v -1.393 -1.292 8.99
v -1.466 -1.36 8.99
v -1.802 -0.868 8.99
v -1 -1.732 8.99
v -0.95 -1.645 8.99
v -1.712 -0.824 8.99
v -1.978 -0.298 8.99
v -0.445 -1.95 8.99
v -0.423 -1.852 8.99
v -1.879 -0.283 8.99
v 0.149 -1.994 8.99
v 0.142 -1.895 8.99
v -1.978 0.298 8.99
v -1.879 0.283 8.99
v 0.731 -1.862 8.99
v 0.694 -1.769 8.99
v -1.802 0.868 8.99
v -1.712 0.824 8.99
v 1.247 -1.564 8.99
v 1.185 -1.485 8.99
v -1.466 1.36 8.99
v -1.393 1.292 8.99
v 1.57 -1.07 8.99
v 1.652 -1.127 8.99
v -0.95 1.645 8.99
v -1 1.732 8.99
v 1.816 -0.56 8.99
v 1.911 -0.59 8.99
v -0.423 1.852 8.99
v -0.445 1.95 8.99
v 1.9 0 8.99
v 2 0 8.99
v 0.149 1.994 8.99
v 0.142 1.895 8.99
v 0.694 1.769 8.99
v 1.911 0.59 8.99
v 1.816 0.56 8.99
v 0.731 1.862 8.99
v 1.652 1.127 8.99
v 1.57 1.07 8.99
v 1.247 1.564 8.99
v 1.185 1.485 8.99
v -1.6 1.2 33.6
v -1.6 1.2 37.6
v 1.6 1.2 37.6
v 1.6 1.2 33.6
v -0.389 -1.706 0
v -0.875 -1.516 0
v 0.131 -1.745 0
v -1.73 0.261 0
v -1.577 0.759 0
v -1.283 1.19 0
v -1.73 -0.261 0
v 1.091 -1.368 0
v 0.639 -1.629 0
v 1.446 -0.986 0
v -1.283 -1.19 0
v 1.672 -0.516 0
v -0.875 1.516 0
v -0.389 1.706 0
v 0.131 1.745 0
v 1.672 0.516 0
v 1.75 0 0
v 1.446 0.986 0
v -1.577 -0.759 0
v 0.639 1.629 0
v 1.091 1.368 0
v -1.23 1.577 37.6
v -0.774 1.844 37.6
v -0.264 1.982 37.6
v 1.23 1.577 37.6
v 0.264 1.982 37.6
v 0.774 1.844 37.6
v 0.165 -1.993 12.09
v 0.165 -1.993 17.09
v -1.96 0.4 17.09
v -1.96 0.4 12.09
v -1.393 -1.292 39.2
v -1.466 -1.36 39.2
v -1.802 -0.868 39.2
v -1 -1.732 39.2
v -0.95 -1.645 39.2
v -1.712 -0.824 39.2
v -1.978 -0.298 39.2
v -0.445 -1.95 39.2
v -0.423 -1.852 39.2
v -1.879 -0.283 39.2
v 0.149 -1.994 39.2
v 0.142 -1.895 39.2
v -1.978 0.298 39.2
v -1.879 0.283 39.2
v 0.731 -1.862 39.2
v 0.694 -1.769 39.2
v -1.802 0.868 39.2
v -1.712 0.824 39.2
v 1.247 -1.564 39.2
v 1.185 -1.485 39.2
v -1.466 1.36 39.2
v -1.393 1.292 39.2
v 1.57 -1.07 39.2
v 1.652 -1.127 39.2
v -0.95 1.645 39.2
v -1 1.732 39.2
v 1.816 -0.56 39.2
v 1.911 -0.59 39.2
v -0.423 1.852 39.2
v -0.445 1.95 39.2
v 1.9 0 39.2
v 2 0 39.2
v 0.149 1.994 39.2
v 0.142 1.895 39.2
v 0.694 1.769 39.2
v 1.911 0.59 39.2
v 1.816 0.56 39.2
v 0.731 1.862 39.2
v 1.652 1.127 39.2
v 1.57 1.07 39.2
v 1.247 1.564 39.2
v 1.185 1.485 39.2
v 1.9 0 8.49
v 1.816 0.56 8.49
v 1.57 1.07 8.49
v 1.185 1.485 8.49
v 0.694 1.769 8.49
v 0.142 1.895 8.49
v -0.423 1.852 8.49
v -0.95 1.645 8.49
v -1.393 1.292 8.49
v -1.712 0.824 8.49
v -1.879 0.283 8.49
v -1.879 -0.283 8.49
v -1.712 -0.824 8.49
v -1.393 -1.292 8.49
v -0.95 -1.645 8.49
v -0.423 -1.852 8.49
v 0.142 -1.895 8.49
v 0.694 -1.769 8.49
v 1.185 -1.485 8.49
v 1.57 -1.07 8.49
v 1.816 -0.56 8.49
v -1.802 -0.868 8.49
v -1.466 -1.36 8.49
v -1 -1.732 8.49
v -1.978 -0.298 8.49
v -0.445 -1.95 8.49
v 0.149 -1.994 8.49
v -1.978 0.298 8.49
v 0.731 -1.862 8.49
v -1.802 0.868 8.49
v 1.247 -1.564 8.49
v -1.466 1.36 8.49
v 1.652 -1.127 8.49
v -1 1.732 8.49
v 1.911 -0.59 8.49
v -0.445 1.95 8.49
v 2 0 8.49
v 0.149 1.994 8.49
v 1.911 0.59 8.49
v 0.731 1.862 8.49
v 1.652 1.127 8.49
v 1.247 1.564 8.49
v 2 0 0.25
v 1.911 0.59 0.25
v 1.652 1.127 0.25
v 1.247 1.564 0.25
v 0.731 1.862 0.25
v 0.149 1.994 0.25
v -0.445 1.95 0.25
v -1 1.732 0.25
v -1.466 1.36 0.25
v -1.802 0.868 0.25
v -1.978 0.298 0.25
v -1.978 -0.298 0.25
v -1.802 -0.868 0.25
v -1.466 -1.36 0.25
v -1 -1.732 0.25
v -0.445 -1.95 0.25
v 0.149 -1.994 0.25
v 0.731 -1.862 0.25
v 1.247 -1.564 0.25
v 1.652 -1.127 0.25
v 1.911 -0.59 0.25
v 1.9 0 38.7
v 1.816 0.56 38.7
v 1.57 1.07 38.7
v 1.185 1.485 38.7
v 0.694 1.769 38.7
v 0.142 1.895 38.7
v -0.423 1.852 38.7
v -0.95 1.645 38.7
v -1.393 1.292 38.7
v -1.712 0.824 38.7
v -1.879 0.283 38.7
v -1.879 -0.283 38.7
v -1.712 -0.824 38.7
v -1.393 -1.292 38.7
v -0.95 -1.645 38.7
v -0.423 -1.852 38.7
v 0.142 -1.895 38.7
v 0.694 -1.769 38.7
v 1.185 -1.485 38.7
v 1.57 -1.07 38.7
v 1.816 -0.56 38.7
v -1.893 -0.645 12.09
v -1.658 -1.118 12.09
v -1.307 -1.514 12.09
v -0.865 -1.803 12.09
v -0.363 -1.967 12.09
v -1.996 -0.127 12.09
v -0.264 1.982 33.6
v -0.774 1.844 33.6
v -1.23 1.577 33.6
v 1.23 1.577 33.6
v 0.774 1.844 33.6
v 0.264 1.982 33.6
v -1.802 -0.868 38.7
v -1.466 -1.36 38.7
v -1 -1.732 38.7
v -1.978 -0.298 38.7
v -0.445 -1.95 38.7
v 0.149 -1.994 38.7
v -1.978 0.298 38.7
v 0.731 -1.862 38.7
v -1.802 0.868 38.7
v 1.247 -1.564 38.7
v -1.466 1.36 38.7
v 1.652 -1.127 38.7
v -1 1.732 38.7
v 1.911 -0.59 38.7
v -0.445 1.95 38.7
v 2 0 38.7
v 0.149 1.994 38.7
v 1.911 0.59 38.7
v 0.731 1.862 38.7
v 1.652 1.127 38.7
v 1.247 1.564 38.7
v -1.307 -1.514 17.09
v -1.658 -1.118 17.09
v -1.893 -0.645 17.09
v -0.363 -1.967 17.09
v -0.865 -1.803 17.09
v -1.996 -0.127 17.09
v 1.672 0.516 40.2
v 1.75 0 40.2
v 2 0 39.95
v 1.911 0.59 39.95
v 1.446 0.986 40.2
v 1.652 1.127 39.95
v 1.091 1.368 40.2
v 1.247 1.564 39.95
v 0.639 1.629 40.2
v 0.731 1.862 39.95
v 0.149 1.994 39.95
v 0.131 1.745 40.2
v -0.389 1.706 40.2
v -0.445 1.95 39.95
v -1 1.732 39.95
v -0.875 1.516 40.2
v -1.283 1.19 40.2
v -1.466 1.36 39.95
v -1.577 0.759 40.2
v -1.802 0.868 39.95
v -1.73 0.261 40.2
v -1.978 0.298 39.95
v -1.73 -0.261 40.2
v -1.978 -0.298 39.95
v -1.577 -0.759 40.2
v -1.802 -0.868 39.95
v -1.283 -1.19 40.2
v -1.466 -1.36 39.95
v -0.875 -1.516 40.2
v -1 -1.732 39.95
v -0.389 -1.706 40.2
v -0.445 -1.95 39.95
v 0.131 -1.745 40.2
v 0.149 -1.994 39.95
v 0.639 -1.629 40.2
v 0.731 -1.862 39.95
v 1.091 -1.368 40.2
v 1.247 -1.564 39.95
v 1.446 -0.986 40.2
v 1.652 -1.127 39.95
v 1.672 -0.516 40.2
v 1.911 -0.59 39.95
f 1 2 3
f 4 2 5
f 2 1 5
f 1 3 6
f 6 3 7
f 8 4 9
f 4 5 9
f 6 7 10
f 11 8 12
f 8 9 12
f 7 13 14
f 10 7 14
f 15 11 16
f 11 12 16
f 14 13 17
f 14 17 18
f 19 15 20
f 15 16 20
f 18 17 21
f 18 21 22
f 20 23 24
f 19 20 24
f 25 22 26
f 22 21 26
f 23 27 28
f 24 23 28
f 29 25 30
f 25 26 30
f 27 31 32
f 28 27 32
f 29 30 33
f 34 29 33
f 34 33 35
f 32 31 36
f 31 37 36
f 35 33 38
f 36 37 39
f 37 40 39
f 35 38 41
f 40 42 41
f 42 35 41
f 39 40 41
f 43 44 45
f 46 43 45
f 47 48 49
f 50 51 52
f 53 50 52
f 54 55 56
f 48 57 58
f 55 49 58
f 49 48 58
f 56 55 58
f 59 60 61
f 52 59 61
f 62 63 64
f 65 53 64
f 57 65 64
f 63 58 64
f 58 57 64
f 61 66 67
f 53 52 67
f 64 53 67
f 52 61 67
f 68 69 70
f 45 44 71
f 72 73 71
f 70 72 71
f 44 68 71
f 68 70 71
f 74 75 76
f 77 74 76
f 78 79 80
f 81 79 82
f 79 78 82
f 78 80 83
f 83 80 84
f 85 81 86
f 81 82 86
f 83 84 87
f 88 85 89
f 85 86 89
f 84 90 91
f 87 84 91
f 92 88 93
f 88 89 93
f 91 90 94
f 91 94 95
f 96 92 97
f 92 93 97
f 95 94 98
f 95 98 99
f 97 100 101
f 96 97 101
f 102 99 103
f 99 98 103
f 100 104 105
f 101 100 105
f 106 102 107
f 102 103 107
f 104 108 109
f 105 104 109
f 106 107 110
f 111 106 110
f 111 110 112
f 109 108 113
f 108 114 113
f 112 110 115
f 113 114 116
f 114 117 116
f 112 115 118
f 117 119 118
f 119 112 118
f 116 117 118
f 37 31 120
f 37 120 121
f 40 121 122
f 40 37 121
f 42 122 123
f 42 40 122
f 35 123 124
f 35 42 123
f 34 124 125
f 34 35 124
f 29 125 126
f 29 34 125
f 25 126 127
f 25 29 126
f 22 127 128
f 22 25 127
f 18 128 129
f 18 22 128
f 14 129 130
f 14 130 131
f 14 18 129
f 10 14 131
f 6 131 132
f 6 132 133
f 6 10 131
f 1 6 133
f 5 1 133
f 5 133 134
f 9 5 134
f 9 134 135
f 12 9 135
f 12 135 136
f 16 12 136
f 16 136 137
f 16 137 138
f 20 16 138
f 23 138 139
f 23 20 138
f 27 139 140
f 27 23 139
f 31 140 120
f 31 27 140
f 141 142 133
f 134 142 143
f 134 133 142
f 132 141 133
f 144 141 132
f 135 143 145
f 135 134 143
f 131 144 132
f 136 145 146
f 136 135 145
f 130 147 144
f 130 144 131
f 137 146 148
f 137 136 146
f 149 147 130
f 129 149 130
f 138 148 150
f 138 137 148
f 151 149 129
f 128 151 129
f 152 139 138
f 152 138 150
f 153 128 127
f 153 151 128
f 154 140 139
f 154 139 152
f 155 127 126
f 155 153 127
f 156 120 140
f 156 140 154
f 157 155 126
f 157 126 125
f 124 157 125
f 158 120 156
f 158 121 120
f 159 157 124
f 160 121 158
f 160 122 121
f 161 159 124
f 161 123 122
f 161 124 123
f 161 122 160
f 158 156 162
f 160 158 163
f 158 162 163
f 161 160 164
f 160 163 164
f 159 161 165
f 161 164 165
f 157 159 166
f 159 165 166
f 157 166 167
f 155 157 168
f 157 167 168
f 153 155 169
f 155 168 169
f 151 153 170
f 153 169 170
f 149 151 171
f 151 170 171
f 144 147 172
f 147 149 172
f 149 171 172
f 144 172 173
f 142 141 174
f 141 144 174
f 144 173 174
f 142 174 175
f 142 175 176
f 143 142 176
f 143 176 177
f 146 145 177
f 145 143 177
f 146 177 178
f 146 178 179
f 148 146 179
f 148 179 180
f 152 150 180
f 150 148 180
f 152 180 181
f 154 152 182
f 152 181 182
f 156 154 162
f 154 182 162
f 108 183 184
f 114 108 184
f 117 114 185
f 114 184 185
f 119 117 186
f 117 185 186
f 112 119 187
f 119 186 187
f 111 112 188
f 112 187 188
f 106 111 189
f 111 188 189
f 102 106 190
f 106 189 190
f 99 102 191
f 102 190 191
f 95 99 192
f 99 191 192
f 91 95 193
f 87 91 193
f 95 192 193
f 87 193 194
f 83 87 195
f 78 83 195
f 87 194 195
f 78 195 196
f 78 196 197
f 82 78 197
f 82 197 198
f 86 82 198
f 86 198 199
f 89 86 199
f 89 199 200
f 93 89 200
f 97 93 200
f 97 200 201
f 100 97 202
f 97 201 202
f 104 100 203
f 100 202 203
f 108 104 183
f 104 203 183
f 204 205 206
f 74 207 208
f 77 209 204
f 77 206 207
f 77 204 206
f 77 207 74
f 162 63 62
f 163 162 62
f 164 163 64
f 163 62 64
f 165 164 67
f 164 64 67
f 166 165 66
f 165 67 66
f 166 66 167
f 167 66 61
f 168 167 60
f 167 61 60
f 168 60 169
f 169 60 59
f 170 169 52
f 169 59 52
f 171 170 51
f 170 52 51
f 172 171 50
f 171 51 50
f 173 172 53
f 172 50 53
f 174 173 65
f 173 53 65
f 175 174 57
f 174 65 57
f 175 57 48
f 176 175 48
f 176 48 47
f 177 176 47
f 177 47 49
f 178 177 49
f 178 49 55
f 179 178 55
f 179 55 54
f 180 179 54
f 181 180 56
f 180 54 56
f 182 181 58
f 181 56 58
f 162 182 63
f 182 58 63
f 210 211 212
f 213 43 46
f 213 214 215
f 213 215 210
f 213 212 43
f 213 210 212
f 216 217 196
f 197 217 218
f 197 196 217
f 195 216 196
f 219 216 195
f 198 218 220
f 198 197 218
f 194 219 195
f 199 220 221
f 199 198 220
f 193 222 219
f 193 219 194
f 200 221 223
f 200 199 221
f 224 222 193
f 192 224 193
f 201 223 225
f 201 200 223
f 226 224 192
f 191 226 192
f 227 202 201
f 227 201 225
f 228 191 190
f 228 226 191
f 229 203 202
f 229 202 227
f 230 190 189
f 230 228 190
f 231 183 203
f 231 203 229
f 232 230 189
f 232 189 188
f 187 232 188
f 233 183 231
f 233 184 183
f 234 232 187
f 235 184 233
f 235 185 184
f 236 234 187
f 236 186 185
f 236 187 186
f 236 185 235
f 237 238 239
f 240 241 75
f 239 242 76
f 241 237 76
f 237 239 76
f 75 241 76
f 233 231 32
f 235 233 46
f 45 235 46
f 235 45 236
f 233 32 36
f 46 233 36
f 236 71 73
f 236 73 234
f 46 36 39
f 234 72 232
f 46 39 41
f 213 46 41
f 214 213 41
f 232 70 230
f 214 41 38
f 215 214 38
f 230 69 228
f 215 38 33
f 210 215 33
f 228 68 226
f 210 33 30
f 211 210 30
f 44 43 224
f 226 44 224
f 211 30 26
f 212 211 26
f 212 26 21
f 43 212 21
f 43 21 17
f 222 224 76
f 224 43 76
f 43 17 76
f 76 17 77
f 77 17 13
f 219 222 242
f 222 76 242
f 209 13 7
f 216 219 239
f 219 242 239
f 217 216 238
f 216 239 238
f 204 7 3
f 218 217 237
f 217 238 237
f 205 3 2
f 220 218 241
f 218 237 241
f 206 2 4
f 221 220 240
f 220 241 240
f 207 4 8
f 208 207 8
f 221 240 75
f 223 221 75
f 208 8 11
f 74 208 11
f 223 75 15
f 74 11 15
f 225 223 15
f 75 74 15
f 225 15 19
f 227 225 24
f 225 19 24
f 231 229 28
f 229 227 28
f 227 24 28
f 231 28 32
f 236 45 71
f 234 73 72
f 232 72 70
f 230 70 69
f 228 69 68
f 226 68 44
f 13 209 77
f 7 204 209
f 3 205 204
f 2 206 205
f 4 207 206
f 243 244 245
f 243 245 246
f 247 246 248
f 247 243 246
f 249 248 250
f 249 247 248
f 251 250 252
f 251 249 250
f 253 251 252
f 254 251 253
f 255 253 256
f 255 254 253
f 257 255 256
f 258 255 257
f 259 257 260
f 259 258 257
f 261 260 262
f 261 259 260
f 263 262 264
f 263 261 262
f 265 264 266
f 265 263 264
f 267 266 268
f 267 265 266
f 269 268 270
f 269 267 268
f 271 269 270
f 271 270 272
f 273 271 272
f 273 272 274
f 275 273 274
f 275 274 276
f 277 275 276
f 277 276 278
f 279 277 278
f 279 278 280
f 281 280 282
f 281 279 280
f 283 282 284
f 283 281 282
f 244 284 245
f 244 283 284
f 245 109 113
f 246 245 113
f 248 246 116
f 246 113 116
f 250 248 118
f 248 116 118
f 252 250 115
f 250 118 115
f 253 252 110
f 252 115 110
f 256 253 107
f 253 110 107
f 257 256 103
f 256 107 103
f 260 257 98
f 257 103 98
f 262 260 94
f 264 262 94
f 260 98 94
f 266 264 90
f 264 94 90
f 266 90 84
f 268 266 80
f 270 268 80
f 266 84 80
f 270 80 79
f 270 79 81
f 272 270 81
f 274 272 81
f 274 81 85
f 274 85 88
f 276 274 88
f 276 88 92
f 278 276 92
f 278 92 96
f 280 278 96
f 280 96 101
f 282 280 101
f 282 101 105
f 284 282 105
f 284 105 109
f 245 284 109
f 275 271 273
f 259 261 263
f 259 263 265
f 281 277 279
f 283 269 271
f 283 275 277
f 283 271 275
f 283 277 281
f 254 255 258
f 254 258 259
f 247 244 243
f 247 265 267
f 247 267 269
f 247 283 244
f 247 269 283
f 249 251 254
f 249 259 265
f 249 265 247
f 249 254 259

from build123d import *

# Parameters (mm, degrees)
CIRCLE_R                     = 2
BOSS_EXTRU_1_DEPTH           = 40.2
ENL_V_MAT_EXTRU_1_DEPTH      = 4
ENL_V_MAT_EXTRU_2_DEPTH      = 5
GORGECIRCLIPPOLULU_OUTSIDE_W = 14.12
GORGECIRCLIPPOLULU_OUTSIDE_H = 14.12
GORGECIRCLIPPOLULU_OUTSIDE_R = 1.9
ENL_V_MAT_EXTRU_3_DEPTH      = 0.5
ESQUISSE1_OUTSIDE_W          = 14.12
ESQUISSE1_OUTSIDE_H          = 14.12
ESQUISSE1_OUTSIDE_R          = 1.9
ENL_V_MAT_EXTRU_4_DEPTH      = 0.5
CHANFREIN1_SIZE              = 0.25
CHANFREIN2_SIZE              = 0.25


with BuildPart() as part:
    # Circle → Boss.-Extru.1 (new body)
    with BuildSketch(Plane.XY):
        Circle(CIRCLE_R)
    extrude(amount=BOSS_EXTRU_1_DEPTH)

    # MeplatPololu → Enlèv. mat.-Extru.1 (cut)
    with BuildSketch(Plane.XY.offset(37.6)):
        with BuildLine():
            Line((-1.6, 1.2), (1.6, 1.2))
            ThreePointArc((1.6, 1.2), (0, 2), (-1.6, 1.2))
        make_face()
    extrude(amount=-ENL_V_MAT_EXTRU_1_DEPTH, mode=Mode.SUBTRACT)

    # MeplatRoueDentee → Enlèv. mat.-Extru.2 (cut)
    with BuildSketch(Plane.XY.offset(17.09)):
        with BuildLine():
            Line((0.164576352, -1.993217154), (-1.959569847, 0.400107505))
            ThreePointArc((-1.959569847, 0.400107505), (-1.495827912, -1.327591374), (0.164576352, -1.993217154))
        make_face()
    extrude(amount=-ENL_V_MAT_EXTRU_2_DEPTH, mode=Mode.SUBTRACT)

    # GorgeCirclipPolulu outside → Enlèv. mat.-Extru.3 (cut)
    with BuildSketch(Plane.XY.offset(38.7)):
        Rectangle(GORGECIRCLIPPOLULU_OUTSIDE_W, GORGECIRCLIPPOLULU_OUTSIDE_H)
        Circle(GORGECIRCLIPPOLULU_OUTSIDE_R, mode=Mode.SUBTRACT)
    extrude(amount=ENL_V_MAT_EXTRU_3_DEPTH, mode=Mode.SUBTRACT)

    # Esquisse1 outside → Enlèv. mat.-Extru.4 (cut)
    with BuildSketch(Plane.XY.offset(8.99)):
        Rectangle(ESQUISSE1_OUTSIDE_W, ESQUISSE1_OUTSIDE_H)
        Circle(ESQUISSE1_OUTSIDE_R, mode=Mode.SUBTRACT)
    extrude(amount=-ENL_V_MAT_EXTRU_4_DEPTH, mode=Mode.SUBTRACT)

    # Chanfrein1
    chanfrein1_edges = [part.edges().sort_by_distance(p)[0] for p in [
        (-2, 0, 40.2),
    ]]
    chamfer(chanfrein1_edges, length=CHANFREIN1_SIZE)

    # Chanfrein2
    chanfrein2_edges = [part.edges().sort_by_distance(p)[0] for p in [
        (-2, 0, 0),
    ]]
    chamfer(chanfrein2_edges, length=CHANFREIN2_SIZE)


solid = part.part
